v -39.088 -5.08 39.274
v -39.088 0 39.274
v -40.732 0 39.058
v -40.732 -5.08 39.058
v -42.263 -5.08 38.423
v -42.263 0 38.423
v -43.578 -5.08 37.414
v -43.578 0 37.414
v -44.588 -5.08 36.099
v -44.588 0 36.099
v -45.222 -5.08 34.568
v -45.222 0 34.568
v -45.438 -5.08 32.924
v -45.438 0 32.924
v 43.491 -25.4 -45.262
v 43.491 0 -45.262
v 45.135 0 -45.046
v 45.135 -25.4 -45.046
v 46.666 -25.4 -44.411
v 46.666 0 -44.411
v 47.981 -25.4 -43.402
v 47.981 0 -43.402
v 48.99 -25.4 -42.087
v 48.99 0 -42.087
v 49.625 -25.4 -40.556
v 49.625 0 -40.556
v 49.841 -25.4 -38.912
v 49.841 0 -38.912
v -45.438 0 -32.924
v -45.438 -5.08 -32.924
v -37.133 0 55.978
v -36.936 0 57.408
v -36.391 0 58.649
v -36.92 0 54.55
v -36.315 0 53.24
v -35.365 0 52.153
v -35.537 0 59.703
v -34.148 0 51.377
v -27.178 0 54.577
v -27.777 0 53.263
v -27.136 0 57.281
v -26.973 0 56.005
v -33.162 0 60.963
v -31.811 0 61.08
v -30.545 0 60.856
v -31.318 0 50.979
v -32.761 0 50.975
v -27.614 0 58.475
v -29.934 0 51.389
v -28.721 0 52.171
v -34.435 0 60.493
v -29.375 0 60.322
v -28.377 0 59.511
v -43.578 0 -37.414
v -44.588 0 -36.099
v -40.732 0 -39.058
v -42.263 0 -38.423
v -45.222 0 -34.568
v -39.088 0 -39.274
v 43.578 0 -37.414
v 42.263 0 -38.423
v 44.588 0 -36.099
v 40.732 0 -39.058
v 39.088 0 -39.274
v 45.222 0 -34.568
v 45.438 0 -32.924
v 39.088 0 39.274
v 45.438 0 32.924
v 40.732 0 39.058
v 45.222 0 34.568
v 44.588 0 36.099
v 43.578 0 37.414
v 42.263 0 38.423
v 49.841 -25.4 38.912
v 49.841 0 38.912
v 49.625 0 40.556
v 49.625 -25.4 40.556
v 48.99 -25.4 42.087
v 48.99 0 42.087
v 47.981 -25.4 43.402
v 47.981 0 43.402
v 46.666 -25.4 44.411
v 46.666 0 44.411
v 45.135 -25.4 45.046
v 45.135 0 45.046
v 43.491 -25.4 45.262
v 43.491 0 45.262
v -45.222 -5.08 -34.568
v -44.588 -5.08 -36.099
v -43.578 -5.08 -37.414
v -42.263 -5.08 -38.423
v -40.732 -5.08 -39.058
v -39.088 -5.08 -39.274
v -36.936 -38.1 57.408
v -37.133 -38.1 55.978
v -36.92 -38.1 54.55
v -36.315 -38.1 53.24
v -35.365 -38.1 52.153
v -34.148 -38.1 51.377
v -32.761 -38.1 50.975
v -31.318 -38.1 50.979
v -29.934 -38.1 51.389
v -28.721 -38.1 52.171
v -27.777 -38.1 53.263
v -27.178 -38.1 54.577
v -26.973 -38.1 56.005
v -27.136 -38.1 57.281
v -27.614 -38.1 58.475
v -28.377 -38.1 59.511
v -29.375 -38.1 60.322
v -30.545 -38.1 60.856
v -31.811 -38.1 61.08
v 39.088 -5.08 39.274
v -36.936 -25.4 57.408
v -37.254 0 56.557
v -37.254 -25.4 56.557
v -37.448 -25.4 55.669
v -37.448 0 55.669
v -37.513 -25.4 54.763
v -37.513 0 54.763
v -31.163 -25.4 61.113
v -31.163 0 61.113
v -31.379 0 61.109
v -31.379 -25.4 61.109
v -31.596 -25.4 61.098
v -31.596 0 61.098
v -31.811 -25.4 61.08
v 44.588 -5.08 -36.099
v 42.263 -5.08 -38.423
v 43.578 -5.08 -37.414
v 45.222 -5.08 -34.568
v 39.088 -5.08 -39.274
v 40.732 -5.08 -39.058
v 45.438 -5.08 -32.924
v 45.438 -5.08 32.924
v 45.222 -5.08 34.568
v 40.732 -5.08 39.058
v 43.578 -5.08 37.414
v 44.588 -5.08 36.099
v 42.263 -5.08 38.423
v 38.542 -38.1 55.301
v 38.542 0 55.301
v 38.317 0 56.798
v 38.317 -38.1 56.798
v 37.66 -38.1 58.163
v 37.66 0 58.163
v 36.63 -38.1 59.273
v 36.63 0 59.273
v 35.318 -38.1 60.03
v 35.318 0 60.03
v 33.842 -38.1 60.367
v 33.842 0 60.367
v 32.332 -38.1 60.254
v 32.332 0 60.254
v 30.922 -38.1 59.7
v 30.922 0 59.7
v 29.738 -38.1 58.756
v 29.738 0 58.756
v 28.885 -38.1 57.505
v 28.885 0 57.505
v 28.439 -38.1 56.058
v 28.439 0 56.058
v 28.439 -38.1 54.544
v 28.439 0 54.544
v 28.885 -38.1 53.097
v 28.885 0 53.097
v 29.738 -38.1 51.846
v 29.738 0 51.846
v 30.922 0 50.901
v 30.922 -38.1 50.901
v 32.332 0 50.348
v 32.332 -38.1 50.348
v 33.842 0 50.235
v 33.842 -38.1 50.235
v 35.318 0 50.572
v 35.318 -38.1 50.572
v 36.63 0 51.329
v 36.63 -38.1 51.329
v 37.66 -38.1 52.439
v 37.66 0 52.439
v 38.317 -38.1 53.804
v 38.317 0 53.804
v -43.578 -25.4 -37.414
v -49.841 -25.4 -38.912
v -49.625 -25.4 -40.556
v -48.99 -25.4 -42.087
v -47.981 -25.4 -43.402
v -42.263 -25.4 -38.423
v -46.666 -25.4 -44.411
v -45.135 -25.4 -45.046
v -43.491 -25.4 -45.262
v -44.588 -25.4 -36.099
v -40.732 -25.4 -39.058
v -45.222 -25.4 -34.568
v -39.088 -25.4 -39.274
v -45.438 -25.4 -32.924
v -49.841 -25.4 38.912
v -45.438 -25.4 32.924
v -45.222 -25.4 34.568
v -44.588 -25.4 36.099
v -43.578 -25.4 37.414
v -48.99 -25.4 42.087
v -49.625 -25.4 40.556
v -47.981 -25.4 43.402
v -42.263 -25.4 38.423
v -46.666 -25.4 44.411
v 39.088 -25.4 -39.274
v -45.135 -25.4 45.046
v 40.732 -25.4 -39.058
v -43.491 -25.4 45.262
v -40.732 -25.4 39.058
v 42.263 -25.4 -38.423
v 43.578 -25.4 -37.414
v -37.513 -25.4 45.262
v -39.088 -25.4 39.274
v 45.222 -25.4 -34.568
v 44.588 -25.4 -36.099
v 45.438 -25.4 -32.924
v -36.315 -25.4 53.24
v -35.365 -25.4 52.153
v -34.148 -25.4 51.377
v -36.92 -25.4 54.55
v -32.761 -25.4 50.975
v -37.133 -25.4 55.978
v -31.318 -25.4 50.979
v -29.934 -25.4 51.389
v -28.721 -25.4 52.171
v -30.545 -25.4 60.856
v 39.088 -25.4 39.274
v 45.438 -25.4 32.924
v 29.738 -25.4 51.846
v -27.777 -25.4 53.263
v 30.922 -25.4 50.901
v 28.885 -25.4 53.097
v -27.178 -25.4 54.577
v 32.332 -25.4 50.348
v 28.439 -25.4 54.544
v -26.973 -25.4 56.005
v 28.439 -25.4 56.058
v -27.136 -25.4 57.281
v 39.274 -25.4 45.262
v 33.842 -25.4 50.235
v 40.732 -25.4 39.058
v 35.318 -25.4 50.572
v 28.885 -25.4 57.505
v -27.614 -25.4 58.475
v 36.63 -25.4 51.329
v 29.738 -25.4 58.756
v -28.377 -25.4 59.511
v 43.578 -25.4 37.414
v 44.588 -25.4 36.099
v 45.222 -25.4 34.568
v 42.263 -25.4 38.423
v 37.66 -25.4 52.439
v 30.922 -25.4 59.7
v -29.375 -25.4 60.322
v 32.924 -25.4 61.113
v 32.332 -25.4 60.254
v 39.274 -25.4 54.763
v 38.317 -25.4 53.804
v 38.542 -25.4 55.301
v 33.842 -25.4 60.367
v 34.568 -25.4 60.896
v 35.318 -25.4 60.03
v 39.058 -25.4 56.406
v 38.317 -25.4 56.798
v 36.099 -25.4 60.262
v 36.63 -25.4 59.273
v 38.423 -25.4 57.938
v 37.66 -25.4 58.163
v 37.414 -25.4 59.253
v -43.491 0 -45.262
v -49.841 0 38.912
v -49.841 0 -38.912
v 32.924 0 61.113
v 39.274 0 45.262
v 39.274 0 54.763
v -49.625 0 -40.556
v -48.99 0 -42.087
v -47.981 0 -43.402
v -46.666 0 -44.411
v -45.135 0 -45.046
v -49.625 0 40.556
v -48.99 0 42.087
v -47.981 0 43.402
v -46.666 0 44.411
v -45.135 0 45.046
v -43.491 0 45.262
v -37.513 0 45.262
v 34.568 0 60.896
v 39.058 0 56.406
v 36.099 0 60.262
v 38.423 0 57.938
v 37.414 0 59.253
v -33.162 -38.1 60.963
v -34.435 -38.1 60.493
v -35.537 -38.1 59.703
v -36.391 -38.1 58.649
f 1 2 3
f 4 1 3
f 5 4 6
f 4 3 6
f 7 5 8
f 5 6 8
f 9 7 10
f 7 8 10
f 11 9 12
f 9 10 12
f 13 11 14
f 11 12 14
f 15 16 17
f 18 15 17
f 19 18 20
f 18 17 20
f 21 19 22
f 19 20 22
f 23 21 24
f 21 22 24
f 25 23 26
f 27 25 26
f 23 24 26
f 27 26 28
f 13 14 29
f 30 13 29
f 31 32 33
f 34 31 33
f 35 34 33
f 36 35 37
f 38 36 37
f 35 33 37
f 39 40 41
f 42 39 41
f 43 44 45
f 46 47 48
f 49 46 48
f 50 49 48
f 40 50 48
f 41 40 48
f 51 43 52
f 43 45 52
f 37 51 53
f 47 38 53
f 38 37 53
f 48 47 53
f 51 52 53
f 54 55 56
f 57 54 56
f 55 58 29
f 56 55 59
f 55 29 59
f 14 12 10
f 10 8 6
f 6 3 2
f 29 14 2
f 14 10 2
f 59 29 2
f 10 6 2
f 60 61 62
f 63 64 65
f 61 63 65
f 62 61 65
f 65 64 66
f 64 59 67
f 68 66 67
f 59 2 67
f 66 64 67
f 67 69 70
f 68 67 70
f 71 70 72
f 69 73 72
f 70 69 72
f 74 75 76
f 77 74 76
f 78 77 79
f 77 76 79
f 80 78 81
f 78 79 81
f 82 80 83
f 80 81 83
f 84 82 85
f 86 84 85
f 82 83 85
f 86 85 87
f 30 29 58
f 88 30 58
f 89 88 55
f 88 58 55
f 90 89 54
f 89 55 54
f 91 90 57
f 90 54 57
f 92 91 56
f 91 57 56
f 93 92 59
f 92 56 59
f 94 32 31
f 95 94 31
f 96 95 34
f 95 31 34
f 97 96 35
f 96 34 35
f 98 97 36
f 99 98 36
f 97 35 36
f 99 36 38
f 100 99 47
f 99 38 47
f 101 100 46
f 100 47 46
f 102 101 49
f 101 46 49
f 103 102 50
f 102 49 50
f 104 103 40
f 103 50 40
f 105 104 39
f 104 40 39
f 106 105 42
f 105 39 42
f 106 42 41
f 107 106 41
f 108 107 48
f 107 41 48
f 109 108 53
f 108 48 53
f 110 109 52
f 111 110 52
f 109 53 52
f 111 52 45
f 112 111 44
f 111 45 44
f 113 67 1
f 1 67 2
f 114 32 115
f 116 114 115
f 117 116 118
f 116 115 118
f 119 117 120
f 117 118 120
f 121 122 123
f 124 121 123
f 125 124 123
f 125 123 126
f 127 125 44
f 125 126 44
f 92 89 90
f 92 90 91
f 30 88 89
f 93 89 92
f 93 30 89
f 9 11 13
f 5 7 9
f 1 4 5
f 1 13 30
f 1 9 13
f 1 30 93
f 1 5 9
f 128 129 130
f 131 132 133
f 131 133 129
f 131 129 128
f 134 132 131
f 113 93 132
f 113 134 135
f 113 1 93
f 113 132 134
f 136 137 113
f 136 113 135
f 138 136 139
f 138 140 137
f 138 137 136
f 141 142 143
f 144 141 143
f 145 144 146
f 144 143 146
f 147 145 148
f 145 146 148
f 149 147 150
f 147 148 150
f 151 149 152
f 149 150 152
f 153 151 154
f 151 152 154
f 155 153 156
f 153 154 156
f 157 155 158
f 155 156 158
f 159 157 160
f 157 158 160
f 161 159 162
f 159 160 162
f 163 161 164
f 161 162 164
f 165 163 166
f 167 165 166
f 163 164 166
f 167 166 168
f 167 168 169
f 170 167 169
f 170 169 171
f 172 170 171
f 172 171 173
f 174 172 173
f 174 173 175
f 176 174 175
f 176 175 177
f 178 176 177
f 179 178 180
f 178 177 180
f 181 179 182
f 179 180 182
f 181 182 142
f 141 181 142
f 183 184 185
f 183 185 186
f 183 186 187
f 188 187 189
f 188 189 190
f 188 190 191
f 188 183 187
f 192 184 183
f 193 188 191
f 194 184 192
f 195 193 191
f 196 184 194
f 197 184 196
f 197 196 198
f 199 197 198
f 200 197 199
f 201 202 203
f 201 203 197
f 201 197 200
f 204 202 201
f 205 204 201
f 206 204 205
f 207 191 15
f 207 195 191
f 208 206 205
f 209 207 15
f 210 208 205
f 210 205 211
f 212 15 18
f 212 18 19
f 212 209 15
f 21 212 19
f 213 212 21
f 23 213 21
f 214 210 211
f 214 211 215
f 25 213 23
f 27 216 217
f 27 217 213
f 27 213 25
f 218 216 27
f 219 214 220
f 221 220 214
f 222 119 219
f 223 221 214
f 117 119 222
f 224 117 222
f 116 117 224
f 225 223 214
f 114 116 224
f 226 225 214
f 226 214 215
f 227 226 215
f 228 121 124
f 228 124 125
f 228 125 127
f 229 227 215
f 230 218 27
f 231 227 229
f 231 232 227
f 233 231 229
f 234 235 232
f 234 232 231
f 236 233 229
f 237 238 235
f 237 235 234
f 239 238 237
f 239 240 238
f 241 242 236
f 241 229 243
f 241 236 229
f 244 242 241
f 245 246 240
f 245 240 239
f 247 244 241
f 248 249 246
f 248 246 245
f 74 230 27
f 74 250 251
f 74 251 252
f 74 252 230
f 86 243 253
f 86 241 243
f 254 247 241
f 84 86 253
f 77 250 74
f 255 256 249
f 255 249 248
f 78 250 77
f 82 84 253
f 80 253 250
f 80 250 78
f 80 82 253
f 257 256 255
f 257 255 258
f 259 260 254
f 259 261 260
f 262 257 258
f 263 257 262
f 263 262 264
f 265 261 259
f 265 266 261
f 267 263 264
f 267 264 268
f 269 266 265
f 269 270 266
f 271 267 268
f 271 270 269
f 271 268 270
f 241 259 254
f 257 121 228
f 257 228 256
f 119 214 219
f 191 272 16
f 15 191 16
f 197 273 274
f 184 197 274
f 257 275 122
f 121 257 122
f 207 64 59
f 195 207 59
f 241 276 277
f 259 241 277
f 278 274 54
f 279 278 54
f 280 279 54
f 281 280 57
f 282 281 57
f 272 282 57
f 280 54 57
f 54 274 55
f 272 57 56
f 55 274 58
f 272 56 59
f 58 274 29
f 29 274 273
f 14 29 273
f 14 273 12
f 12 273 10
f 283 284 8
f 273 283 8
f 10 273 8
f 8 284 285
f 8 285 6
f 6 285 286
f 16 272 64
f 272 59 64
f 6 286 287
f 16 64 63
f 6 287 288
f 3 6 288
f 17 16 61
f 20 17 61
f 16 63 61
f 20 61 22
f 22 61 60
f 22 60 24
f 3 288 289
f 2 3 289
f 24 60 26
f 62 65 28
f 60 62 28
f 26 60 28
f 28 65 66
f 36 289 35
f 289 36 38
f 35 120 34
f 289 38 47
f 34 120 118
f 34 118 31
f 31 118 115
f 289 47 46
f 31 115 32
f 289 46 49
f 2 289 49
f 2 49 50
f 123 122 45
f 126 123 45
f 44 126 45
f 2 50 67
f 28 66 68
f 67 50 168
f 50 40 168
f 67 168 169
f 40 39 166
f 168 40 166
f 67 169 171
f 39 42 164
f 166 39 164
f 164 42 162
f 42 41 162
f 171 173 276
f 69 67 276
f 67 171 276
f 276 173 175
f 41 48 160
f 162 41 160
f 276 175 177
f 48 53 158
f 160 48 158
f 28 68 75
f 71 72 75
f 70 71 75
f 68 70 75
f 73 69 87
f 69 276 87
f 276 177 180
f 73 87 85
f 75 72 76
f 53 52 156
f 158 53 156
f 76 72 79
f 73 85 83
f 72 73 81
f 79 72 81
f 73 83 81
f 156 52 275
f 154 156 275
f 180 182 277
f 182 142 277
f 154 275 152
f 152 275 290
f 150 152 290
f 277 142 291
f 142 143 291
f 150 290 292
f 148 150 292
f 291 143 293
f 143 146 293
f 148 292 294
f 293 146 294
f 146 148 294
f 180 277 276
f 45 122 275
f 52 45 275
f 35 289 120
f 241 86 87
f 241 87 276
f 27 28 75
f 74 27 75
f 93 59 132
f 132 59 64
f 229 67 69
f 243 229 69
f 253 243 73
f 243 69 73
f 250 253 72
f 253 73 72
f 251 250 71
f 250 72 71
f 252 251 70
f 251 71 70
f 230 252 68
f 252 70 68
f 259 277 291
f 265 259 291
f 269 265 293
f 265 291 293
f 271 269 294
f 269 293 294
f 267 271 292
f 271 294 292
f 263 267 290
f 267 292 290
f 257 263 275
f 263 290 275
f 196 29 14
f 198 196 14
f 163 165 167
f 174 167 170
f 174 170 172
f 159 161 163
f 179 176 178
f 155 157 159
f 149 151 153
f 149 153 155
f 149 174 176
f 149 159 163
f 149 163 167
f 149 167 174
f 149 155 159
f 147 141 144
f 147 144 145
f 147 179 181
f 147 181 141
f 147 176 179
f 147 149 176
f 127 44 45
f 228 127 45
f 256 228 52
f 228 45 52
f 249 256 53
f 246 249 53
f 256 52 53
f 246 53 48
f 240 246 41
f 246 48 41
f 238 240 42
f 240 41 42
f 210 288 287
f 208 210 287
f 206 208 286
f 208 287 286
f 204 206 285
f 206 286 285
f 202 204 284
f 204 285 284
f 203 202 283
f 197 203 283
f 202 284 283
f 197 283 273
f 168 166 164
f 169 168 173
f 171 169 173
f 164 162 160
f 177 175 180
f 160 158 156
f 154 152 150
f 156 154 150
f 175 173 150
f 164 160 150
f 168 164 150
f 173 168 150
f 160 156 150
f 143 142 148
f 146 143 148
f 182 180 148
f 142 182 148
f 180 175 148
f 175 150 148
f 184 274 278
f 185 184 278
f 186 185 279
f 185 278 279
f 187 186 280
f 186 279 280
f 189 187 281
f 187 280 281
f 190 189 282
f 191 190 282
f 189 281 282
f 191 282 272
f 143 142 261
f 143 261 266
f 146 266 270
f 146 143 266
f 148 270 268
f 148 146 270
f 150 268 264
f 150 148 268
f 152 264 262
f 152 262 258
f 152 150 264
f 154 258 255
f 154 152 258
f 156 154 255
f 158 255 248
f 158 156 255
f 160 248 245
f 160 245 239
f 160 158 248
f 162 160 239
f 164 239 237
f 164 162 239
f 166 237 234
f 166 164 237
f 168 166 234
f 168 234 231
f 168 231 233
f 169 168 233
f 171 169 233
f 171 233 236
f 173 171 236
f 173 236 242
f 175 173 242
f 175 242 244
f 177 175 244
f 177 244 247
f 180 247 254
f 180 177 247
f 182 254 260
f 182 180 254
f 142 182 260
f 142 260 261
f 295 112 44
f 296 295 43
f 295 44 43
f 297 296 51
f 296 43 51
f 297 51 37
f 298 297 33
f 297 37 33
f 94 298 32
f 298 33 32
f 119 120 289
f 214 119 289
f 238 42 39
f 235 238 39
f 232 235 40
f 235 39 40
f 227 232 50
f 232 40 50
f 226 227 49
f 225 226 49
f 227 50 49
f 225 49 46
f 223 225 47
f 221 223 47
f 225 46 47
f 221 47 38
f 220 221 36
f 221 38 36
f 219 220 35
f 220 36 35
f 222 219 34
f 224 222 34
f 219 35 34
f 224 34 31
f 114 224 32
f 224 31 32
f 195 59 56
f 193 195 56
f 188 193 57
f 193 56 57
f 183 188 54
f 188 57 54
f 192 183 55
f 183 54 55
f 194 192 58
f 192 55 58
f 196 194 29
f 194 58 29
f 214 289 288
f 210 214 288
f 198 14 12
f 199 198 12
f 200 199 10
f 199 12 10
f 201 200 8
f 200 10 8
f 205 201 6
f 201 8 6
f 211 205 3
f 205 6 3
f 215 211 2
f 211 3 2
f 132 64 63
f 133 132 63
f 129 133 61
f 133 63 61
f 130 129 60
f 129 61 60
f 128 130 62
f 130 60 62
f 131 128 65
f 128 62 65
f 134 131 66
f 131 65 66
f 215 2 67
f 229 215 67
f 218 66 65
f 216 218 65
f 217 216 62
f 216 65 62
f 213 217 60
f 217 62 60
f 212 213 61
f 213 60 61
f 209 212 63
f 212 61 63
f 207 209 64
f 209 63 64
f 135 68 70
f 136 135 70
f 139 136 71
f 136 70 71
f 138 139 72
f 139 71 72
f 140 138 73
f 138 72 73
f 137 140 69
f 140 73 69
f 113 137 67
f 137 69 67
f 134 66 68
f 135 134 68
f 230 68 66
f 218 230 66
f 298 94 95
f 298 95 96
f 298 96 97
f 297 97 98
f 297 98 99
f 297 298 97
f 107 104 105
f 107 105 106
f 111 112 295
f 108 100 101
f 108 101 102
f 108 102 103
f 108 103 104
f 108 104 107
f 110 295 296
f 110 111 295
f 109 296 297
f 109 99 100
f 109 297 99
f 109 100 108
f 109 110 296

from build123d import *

# Parameters (mm, degrees)
F1_DEPTH = 5.08
F0_R     = 5.08
F2_DEPTH = 25.4
F3_DEPTH = 38.1


with BuildPart() as f1:
    # F0 (on Front) → F1 (new body)
    with BuildSketch(Plane.XZ):
        with BuildLine():
            Line((39.0883027781, 39.2741925017), (-37.5130171202, 39.2741925017))
            Line((-37.5130171202, 39.2741925017), (-39.0883027781, 39.2741925017))
            ThreePointArc((-39.0883027781, 39.2741925017), (-43.5784308386, 37.4143205622), (-45.4383027781, 32.9241925017))
            Line((-45.4383027781, 32.9241925017), (-45.4383027781, -32.9241925017))
            ThreePointArc((-45.4383027781, -32.9241925017), (-43.5784308386, -37.4143205622), (-39.0883027781, -39.2741925017))
            Line((-39.0883027781, -39.2741925017), (39.0883027781, -39.2741925017))
            ThreePointArc((39.0883027781, -39.2741925017), (43.5784308386, -37.4143205622), (45.4383027781, -32.9241925017))
            Line((45.4383027781, -32.9241925017), (45.4383027781, 32.9241925017))
            ThreePointArc((45.4383027781, 32.9241925017), (43.5784308386, 37.4143205622), (39.0883027781, 39.2741925017))
        make_face()
    extrude(amount=F1_DEPTH)


with BuildPart() as f2:
    # F0 (on Front) → F2 (new body)
    with BuildSketch(Plane.XZ):
        with BuildLine():
            Line((-37.5130171202, 45.2621831046), (-43.491237673, 45.2621831046))
            ThreePointArc((-43.491237673, 45.2621831046), (-47.9813657336, 43.4023111652), (-49.841237673, 38.9121831046))
            Line((-49.841237673, 38.9121831046), (-49.841237673, -38.9121831046))
            ThreePointArc((-49.841237673, -38.9121831046), (-47.9813657336, -43.4023111652), (-43.491237673, -45.2621831046))
            Line((-43.491237673, -45.2621831046), (43.491237673, -45.2621831046))
            ThreePointArc((43.491237673, -45.2621831046), (47.9813657336, -43.4023111652), (49.841237673, -38.9121831046))
            Line((49.841237673, -38.9121831046), (49.841237673, 38.9121831046))
            ThreePointArc((49.841237673, 38.9121831046), (47.9813657336, 43.4023111652), (43.491237673, 45.2621831046))
            Line((43.491237673, 45.2621831046), (39.2741889428, 45.2621831046))
            Line((39.2741889428, 45.2621831046), (39.2741889428, 39.2741925017))
            Line((39.2741889428, 39.2741925017), (39.0883027781, 39.2741925017))
            ThreePointArc((39.0883027781, 39.2741925017), (43.5784308386, 37.4143205622), (45.4383027781, 32.9241925017))
            Line((45.4383027781, 32.9241925017), (45.4383027781, -32.9241925017))
            ThreePointArc((45.4383027781, -32.9241925017), (43.5784308386, -37.4143205622), (39.0883027781, -39.2741925017))
            Line((39.0883027781, -39.2741925017), (-39.0883027781, -39.2741925017))
            ThreePointArc((-39.0883027781, -39.2741925017), (-43.5784308386, -37.4143205622), (-45.4383027781, -32.9241925017))
            Line((-45.4383027781, -32.9241925017), (-45.4383027781, 32.9241925017))
            ThreePointArc((-45.4383027781, 32.9241925017), (-43.5784308386, 37.4143205622), (-39.0883027781, 39.2741925017))
            Line((-39.0883027781, 39.2741925017), (-37.5130171202, 39.2741925017))
            Line((-37.5130171202, 39.2741925017), (-37.5130171202, 45.2621831046))
        make_face()
        Polygon((39.2741889428, 45.2621831046), (-37.5130171202, 45.2621831046), (-37.5130171202, 39.2741925017), (39.0883027781, 39.2741925017), (39.2741889428, 39.2741925017), align=None)
        with BuildLine():
            Line((-37.5130171202, 54.7627508617), (-37.5130171202, 45.2621831046))
            Line((-37.5130171202, 45.2621831046), (39.2741889428, 45.2621831046))
            Line((39.2741889428, 45.2621831046), (39.2741889428, 54.7627508617))
            ThreePointArc((39.2741889428, 54.7627508617), (37.4143170034, 59.2528789222), (32.9241889428, 61.1127508617))
            Line((32.9241889428, 61.1127508617), (-31.1630171202, 61.1127508617))
            ThreePointArc((-31.1630171202, 61.1127508617), (-31.4875663404, 61.1044515645), (-31.8112672046, 61.0795753668))
            ThreePointArc((-31.8112672046, 61.0795753668), (-28.3766707055, 59.5108074846), (-26.973374861, 56.0053479495))
            ThreePointArc((-26.973374861, 56.0053479495), (-32.761377774, 50.9749273035), (-36.9360252056, 57.4075339616))
            ThreePointArc((-36.9360252056, 57.4075339616), (-37.3670924478, 56.1162460884), (-37.5130171202, 54.7627508617))
        make_face()
        with Locations((33.4623180133, 55.3008763733)):
            Circle(F0_R, mode=Mode.SUBTRACT)
    extrude(amount=F2_DEPTH)


with BuildPart() as f3:
    # F0 (on Front) → F3 (new body)
    with BuildSketch(Plane.XZ):
        with BuildLine():
            ThreePointArc((-31.8112672046, 61.0795753668), (-35.0121974529, 60.1347267005), (-36.9360252056, 57.4075339616))
            ThreePointArc((-36.9360252056, 57.4075339616), (-34.8615453601, 59.9244743005), (-31.8112672046, 61.0795753668))
        make_face()
        with BuildLine():
            ThreePointArc((-31.8112672046, 61.0795753668), (-34.8615453601, 59.9244743005), (-36.9360252056, 57.4075339616))
            ThreePointArc((-36.9360252056, 57.4075339616), (-32.761377774, 50.9749273035), (-26.973374861, 56.0053479495))
            ThreePointArc((-26.973374861, 56.0053479495), (-28.3766707055, 59.5108074846), (-31.8112672046, 61.0795753668))
        make_face()
    extrude(amount=F3_DEPTH)


with BuildPart() as f3b:
    # F0 (on Front) → F3, piece 2 (new body)
    with BuildSketch(Plane.XZ):
        with Locations((33.4623180133, 55.3008763733)):
            Circle(F0_R)
    extrude(amount=F3_DEPTH)


solid = Compound([f1.part, f2.part, f3.part, f3b.part])
